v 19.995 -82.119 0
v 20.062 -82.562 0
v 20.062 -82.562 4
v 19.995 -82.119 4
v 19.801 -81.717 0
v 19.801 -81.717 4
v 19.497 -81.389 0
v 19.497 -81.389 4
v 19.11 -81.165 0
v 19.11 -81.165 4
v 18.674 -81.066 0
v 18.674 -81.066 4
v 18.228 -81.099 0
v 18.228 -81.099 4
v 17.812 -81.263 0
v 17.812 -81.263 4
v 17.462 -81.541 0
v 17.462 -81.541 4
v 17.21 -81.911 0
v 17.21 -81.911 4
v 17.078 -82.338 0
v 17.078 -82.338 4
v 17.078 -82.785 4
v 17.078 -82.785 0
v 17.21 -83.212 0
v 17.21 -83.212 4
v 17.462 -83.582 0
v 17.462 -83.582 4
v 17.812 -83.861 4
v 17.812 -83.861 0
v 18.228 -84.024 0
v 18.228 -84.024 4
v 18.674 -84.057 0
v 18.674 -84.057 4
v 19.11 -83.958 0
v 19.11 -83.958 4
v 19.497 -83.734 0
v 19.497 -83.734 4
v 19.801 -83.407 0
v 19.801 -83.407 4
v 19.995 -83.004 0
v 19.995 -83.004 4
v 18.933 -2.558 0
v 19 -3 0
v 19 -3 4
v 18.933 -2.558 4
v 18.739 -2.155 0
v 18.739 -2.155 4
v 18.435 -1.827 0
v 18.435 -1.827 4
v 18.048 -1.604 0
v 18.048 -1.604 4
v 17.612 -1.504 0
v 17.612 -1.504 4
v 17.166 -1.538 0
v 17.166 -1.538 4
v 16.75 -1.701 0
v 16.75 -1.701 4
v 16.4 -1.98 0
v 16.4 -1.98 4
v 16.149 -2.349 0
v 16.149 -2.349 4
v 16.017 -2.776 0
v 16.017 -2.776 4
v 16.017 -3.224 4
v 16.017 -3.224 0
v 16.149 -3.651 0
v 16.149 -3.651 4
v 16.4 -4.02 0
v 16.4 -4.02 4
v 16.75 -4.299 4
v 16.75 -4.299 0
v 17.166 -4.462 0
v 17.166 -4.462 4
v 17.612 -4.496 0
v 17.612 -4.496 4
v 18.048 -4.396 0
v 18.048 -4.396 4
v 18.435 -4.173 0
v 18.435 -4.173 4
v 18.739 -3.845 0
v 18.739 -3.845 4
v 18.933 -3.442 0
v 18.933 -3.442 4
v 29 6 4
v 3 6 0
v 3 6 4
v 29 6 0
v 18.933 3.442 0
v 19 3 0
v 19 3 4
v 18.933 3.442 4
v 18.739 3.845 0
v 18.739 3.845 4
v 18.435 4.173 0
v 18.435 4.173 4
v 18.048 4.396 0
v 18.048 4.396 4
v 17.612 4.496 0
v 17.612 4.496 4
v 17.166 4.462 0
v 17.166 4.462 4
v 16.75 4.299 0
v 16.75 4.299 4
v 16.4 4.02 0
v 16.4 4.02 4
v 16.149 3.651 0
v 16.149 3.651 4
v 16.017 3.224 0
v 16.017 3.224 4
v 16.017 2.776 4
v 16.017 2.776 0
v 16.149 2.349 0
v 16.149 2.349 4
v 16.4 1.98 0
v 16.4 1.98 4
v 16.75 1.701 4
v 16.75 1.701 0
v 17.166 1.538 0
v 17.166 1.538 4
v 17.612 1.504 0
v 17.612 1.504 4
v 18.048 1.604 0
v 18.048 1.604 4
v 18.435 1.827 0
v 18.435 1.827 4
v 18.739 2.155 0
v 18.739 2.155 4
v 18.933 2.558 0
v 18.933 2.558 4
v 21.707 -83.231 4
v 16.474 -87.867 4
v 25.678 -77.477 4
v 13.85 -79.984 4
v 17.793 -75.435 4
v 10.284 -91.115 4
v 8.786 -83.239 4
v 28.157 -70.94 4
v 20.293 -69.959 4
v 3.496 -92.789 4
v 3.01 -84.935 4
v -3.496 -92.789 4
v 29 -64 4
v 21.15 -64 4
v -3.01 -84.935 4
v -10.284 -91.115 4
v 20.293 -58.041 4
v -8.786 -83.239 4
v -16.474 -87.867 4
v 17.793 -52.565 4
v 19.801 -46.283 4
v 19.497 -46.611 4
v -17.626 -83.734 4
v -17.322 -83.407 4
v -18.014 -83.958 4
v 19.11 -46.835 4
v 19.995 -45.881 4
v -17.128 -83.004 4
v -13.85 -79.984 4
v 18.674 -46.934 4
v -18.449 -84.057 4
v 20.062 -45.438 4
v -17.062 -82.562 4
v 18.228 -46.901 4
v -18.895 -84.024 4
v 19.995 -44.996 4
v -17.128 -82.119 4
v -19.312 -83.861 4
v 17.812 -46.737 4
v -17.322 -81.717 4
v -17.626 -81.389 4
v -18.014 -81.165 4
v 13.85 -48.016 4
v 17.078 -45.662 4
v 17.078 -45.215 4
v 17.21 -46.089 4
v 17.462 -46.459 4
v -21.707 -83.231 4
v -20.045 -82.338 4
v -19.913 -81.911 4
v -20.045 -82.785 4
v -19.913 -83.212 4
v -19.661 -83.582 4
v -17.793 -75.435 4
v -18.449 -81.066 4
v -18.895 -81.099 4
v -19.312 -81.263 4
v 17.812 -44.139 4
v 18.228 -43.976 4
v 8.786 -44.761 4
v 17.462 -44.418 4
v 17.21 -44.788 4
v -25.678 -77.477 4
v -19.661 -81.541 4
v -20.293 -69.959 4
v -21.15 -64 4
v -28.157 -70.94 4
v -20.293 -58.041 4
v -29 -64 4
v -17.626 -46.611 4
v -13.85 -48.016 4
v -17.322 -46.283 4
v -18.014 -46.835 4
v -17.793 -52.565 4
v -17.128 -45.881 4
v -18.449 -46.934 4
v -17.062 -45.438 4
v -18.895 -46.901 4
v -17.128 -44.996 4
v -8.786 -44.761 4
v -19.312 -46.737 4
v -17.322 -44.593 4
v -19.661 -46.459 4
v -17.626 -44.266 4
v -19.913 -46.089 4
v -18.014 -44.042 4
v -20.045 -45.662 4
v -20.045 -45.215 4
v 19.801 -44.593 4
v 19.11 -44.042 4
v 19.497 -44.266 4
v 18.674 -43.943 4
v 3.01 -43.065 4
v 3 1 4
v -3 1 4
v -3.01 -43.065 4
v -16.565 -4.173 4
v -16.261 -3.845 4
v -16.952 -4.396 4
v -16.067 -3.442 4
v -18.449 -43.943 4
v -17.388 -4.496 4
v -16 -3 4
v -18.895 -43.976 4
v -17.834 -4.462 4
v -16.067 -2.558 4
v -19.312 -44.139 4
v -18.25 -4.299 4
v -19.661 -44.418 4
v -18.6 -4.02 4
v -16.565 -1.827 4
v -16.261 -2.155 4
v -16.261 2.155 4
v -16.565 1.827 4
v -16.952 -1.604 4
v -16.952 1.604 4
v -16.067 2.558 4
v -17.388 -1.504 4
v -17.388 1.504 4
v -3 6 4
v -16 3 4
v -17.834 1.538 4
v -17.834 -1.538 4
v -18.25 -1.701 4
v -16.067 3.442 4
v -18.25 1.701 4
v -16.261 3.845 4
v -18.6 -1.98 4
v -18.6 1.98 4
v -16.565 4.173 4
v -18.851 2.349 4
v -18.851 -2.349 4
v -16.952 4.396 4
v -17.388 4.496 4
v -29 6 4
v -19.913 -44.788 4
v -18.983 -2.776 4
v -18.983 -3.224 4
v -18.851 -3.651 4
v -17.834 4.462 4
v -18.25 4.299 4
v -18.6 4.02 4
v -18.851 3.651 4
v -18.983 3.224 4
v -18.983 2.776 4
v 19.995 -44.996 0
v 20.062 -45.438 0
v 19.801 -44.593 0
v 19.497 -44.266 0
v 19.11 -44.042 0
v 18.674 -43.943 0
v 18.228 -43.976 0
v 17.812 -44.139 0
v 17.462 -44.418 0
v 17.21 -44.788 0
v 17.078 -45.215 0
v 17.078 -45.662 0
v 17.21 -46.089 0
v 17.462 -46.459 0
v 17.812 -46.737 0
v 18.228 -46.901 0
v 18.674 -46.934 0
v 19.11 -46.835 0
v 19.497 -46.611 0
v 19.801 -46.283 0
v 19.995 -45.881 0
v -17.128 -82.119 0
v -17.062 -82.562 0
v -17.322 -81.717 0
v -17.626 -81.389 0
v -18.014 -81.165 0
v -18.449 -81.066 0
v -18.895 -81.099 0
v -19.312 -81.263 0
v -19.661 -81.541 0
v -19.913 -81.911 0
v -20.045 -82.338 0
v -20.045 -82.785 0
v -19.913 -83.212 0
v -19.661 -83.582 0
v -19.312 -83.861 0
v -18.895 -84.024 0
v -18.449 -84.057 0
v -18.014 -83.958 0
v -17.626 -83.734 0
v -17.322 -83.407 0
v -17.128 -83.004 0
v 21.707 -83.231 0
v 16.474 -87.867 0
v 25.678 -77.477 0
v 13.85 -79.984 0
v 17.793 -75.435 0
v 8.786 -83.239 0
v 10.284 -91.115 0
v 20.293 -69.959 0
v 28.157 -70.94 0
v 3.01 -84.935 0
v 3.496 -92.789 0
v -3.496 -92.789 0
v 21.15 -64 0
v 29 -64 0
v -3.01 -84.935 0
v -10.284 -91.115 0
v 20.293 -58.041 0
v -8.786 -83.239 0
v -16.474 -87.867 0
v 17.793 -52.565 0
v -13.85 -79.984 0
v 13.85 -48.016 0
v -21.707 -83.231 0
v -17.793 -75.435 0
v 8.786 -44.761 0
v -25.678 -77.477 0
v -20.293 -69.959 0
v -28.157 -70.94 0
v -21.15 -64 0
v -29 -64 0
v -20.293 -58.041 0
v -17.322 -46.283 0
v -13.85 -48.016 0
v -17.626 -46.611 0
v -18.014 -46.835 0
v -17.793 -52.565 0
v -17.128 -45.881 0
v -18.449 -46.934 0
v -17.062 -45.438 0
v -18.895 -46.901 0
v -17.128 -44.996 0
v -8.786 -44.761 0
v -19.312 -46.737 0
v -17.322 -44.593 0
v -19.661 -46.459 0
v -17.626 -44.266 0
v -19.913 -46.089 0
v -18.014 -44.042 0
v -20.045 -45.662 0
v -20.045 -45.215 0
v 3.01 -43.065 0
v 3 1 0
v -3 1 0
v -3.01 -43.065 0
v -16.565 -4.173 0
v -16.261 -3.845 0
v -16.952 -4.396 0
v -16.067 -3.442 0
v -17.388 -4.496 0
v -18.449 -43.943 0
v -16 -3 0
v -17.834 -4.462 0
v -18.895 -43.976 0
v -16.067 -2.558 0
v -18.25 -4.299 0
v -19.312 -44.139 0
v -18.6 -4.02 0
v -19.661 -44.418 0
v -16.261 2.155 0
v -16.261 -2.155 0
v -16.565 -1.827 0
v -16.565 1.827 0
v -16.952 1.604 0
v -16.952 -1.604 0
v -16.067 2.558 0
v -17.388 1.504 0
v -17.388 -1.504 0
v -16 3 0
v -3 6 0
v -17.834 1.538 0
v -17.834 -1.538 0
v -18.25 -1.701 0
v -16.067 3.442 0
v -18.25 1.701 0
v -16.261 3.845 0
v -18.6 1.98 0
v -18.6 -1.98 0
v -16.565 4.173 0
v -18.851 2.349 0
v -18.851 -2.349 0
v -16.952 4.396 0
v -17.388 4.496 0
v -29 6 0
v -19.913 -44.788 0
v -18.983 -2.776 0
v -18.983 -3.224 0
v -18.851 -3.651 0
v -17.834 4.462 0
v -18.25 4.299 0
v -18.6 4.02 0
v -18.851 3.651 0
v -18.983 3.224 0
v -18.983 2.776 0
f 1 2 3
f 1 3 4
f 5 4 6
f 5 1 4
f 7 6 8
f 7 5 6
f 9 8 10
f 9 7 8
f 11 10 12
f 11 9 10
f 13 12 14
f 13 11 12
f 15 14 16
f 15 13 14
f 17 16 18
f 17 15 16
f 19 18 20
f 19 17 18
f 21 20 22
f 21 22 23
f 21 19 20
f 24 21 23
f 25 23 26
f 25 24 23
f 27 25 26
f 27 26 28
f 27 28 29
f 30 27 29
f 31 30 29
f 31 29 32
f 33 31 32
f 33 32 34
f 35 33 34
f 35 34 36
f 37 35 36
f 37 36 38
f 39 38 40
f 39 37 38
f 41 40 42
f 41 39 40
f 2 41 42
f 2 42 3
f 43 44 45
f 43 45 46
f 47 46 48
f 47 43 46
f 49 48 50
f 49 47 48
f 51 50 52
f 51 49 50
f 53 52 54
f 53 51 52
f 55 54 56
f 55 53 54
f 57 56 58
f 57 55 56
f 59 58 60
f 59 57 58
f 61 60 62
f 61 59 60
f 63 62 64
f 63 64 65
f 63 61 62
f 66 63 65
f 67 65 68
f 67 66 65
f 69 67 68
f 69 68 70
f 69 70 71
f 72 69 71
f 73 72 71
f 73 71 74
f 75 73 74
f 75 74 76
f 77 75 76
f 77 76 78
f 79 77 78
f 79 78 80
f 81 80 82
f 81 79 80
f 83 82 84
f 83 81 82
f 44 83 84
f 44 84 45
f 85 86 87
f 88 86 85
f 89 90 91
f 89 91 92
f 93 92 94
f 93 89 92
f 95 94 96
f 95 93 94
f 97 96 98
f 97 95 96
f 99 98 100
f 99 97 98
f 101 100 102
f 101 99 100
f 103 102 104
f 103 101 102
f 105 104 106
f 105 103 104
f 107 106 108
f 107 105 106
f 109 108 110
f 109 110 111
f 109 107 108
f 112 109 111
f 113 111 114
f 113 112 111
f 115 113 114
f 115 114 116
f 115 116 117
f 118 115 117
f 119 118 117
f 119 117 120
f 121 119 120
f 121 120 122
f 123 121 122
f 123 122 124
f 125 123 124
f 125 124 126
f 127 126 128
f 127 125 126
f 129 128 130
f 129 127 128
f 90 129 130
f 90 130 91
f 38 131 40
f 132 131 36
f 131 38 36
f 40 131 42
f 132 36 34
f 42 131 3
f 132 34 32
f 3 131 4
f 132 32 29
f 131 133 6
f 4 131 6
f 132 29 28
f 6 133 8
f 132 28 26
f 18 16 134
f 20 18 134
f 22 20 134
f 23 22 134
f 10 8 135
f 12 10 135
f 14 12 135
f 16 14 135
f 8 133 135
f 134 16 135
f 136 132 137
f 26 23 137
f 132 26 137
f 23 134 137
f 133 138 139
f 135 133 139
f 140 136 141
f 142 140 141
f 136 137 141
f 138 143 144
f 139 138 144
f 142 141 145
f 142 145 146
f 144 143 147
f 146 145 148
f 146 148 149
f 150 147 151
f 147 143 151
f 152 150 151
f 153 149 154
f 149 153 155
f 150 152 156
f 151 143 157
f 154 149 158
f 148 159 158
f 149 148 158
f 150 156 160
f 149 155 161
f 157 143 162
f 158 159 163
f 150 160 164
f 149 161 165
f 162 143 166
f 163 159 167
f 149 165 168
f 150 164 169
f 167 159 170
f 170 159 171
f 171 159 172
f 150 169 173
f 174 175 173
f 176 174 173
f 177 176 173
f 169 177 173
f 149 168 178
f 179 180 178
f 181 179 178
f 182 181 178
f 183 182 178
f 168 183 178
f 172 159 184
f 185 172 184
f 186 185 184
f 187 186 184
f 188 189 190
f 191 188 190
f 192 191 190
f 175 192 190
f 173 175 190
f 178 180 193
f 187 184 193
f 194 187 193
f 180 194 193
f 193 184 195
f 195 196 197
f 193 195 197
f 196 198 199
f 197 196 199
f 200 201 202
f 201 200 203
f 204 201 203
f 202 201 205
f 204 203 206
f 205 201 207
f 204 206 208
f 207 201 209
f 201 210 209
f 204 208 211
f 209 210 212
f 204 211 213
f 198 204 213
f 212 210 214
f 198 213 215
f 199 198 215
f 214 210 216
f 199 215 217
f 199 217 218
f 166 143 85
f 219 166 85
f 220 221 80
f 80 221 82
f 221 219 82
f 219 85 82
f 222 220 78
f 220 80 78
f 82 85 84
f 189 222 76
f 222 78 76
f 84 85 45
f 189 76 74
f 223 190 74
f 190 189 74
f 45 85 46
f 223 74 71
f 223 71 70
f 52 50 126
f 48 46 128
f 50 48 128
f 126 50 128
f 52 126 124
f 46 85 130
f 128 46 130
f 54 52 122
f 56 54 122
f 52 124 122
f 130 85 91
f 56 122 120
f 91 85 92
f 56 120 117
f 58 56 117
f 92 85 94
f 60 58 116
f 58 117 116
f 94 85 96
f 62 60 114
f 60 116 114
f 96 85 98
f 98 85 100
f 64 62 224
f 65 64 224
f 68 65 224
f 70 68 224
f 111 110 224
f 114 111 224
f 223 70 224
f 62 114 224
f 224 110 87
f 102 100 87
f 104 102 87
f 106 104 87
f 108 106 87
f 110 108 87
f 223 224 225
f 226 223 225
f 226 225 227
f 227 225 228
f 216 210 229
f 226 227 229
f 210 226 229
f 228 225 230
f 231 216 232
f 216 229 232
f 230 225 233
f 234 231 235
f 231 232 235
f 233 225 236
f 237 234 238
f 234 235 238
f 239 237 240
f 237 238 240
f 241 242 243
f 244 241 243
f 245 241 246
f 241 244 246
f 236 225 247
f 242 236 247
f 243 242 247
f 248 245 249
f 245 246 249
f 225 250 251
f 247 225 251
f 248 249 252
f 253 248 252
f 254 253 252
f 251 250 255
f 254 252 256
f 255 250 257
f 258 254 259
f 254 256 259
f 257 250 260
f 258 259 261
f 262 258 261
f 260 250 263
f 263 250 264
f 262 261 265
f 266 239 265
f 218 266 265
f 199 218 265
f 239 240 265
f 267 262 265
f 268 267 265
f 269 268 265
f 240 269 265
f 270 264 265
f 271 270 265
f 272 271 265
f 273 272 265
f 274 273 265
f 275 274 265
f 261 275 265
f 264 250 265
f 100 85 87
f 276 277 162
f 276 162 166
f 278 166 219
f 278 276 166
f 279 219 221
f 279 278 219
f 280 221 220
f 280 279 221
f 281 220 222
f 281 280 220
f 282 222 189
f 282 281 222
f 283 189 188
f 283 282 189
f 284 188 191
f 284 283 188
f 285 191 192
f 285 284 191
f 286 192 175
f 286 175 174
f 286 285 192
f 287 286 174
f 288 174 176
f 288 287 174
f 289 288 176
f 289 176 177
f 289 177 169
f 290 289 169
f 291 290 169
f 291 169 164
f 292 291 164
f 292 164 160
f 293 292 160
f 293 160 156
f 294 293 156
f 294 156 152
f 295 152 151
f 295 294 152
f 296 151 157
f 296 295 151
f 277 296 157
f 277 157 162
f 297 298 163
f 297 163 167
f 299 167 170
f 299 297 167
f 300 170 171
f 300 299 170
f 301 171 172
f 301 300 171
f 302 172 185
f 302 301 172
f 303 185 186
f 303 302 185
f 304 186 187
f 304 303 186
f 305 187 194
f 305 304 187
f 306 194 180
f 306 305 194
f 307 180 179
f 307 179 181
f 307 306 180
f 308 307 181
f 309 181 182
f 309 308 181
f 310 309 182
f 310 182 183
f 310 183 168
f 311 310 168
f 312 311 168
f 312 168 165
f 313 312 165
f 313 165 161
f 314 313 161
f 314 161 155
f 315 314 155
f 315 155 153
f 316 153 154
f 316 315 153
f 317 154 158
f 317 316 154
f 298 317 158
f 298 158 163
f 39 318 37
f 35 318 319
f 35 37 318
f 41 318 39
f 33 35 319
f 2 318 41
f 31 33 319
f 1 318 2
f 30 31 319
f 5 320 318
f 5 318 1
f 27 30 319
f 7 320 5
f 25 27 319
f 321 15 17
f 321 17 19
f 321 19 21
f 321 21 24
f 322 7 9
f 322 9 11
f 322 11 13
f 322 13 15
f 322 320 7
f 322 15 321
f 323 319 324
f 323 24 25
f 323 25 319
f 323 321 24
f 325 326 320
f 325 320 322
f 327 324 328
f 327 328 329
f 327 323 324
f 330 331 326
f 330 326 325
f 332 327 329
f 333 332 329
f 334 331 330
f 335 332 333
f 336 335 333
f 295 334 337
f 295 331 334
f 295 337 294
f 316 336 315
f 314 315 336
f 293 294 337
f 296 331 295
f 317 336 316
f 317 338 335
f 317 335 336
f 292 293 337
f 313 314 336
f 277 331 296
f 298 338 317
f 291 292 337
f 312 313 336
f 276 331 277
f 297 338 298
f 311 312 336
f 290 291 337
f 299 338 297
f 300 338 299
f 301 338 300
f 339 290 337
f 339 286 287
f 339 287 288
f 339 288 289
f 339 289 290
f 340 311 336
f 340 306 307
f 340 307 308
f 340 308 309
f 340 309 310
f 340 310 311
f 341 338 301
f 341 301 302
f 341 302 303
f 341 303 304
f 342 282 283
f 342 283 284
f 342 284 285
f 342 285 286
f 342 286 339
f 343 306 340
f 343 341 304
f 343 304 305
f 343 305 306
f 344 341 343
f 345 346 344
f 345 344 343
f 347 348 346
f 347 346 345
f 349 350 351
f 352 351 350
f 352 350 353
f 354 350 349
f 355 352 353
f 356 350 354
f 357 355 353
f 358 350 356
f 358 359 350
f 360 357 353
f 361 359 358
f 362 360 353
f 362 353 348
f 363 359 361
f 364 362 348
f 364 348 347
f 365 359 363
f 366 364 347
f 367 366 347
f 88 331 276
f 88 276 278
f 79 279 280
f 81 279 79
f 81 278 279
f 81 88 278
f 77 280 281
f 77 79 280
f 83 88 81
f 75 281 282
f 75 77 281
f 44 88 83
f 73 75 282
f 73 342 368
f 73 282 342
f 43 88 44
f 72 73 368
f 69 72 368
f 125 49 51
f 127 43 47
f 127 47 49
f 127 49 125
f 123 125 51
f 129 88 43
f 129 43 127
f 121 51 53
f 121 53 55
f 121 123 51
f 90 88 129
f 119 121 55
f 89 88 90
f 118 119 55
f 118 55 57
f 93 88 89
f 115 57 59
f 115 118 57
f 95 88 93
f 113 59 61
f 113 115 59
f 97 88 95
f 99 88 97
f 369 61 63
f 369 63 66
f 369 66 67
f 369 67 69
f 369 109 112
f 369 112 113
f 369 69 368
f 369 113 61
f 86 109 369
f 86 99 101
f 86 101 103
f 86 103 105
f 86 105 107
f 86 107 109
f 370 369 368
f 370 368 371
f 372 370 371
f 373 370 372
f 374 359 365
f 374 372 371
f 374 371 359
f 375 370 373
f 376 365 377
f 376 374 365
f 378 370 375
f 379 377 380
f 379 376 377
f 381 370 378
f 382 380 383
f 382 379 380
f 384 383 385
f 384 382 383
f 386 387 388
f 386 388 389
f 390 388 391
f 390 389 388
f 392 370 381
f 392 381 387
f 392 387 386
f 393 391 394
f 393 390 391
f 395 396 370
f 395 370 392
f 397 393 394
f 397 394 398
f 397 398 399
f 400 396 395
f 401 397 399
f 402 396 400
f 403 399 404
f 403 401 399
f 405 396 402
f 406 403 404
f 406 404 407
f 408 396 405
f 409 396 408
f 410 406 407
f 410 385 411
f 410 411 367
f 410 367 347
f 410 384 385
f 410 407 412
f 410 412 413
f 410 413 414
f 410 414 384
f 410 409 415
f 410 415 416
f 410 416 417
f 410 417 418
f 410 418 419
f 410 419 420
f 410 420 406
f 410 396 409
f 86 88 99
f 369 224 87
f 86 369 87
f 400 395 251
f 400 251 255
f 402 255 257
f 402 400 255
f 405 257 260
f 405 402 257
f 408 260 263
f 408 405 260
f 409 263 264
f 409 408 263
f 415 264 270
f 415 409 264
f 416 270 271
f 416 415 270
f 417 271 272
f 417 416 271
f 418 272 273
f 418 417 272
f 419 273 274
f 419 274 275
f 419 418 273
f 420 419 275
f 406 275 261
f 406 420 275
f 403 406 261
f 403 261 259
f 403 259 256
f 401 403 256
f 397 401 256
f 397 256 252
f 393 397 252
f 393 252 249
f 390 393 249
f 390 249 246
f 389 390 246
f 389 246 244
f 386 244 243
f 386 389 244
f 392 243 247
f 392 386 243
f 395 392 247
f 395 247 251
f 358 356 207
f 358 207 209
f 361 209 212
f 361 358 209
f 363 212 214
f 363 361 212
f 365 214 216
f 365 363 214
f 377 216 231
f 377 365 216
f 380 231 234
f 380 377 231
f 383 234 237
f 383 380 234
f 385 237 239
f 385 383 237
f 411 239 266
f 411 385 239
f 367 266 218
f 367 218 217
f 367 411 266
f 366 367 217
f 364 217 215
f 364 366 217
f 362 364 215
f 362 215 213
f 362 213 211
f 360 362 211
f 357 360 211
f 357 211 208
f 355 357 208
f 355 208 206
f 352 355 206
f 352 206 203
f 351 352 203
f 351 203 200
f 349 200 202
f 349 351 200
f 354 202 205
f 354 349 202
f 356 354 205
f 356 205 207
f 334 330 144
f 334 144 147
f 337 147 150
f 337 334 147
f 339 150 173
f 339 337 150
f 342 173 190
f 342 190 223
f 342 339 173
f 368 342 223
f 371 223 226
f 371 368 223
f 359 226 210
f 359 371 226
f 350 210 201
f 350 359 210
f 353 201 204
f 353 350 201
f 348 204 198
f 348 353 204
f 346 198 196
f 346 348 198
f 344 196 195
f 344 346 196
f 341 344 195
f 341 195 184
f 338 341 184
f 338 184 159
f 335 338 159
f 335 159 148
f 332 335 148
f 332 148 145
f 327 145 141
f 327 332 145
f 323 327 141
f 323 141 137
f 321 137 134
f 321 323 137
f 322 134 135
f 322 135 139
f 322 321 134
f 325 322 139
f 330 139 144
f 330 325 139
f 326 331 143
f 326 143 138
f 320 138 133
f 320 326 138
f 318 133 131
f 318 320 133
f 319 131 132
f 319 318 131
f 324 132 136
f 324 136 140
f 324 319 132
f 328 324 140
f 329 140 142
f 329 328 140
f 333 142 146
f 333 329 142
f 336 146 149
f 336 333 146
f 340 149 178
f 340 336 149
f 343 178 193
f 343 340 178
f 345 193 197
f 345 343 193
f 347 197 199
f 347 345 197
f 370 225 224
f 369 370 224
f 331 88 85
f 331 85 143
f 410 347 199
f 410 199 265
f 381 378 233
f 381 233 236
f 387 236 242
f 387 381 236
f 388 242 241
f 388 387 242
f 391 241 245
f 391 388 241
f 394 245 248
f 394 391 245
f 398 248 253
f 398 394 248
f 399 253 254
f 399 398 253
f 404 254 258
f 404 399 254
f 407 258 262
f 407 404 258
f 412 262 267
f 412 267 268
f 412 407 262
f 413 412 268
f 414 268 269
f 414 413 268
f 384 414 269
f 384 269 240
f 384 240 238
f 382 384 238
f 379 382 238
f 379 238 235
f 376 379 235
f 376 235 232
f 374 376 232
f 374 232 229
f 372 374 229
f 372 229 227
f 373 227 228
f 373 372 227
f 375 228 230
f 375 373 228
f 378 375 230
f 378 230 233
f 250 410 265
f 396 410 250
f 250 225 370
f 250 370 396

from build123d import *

# Parameters (mm, degrees)
SKETCH_1_R          = 21.15
SKETCH_1_R_2        = 1.5
EXTRUDE_1_DEPTH     = 4
SKETCH_2_W          = 6
SKETCH_2_H          = 5
CUT_EXTRUDE_1_DEPTH = 98.49871794


with BuildPart() as part:
    # 草图1 → 凸台-拉伸1 (new body)
    with BuildSketch(Plane.XY):
        with BuildLine():
            Line((-29, 6), (29, 6))
            Line((29, 6), (29, -64))
            ThreePointArc((29, -64), (0, -93), (-29, -64))
            Line((-29, -64), (-29, 6))
        make_face()
        with Locations((0, -64)):
            Circle(SKETCH_1_R, mode=Mode.SUBTRACT)
        with Locations((-17.5, 3)):
            Circle(SKETCH_1_R_2, mode=Mode.SUBTRACT)
        with Locations((17.5, 3)):
            Circle(SKETCH_1_R_2, mode=Mode.SUBTRACT)
        with Locations((18.561553006, -82.561553006)):
            Circle(SKETCH_1_R_2, mode=Mode.SUBTRACT)
        with Locations((-18.561553006, -82.561553006)):
            Circle(SKETCH_1_R_2, mode=Mode.SUBTRACT)
        with Locations((-18.561553006, -45.438446994)):
            Circle(SKETCH_1_R_2, mode=Mode.SUBTRACT)
        with Locations((18.561553006, -45.438446994)):
            Circle(SKETCH_1_R_2, mode=Mode.SUBTRACT)
        with Locations((-17.5, -3)):
            Circle(SKETCH_1_R_2, mode=Mode.SUBTRACT)
        with Locations((17.5, -3)):
            Circle(SKETCH_1_R_2, mode=Mode.SUBTRACT)
    extrude(amount=EXTRUDE_1_DEPTH)

    # 草图2 → 切除-拉伸1 (cut, through all)
    with BuildSketch(Plane.XY.offset(4)):
        with Locations((0, 3.5)):
            Rectangle(SKETCH_2_W, SKETCH_2_H)
    extrude(amount=-CUT_EXTRUDE_1_DEPTH, mode=Mode.SUBTRACT)


solid = part.part
